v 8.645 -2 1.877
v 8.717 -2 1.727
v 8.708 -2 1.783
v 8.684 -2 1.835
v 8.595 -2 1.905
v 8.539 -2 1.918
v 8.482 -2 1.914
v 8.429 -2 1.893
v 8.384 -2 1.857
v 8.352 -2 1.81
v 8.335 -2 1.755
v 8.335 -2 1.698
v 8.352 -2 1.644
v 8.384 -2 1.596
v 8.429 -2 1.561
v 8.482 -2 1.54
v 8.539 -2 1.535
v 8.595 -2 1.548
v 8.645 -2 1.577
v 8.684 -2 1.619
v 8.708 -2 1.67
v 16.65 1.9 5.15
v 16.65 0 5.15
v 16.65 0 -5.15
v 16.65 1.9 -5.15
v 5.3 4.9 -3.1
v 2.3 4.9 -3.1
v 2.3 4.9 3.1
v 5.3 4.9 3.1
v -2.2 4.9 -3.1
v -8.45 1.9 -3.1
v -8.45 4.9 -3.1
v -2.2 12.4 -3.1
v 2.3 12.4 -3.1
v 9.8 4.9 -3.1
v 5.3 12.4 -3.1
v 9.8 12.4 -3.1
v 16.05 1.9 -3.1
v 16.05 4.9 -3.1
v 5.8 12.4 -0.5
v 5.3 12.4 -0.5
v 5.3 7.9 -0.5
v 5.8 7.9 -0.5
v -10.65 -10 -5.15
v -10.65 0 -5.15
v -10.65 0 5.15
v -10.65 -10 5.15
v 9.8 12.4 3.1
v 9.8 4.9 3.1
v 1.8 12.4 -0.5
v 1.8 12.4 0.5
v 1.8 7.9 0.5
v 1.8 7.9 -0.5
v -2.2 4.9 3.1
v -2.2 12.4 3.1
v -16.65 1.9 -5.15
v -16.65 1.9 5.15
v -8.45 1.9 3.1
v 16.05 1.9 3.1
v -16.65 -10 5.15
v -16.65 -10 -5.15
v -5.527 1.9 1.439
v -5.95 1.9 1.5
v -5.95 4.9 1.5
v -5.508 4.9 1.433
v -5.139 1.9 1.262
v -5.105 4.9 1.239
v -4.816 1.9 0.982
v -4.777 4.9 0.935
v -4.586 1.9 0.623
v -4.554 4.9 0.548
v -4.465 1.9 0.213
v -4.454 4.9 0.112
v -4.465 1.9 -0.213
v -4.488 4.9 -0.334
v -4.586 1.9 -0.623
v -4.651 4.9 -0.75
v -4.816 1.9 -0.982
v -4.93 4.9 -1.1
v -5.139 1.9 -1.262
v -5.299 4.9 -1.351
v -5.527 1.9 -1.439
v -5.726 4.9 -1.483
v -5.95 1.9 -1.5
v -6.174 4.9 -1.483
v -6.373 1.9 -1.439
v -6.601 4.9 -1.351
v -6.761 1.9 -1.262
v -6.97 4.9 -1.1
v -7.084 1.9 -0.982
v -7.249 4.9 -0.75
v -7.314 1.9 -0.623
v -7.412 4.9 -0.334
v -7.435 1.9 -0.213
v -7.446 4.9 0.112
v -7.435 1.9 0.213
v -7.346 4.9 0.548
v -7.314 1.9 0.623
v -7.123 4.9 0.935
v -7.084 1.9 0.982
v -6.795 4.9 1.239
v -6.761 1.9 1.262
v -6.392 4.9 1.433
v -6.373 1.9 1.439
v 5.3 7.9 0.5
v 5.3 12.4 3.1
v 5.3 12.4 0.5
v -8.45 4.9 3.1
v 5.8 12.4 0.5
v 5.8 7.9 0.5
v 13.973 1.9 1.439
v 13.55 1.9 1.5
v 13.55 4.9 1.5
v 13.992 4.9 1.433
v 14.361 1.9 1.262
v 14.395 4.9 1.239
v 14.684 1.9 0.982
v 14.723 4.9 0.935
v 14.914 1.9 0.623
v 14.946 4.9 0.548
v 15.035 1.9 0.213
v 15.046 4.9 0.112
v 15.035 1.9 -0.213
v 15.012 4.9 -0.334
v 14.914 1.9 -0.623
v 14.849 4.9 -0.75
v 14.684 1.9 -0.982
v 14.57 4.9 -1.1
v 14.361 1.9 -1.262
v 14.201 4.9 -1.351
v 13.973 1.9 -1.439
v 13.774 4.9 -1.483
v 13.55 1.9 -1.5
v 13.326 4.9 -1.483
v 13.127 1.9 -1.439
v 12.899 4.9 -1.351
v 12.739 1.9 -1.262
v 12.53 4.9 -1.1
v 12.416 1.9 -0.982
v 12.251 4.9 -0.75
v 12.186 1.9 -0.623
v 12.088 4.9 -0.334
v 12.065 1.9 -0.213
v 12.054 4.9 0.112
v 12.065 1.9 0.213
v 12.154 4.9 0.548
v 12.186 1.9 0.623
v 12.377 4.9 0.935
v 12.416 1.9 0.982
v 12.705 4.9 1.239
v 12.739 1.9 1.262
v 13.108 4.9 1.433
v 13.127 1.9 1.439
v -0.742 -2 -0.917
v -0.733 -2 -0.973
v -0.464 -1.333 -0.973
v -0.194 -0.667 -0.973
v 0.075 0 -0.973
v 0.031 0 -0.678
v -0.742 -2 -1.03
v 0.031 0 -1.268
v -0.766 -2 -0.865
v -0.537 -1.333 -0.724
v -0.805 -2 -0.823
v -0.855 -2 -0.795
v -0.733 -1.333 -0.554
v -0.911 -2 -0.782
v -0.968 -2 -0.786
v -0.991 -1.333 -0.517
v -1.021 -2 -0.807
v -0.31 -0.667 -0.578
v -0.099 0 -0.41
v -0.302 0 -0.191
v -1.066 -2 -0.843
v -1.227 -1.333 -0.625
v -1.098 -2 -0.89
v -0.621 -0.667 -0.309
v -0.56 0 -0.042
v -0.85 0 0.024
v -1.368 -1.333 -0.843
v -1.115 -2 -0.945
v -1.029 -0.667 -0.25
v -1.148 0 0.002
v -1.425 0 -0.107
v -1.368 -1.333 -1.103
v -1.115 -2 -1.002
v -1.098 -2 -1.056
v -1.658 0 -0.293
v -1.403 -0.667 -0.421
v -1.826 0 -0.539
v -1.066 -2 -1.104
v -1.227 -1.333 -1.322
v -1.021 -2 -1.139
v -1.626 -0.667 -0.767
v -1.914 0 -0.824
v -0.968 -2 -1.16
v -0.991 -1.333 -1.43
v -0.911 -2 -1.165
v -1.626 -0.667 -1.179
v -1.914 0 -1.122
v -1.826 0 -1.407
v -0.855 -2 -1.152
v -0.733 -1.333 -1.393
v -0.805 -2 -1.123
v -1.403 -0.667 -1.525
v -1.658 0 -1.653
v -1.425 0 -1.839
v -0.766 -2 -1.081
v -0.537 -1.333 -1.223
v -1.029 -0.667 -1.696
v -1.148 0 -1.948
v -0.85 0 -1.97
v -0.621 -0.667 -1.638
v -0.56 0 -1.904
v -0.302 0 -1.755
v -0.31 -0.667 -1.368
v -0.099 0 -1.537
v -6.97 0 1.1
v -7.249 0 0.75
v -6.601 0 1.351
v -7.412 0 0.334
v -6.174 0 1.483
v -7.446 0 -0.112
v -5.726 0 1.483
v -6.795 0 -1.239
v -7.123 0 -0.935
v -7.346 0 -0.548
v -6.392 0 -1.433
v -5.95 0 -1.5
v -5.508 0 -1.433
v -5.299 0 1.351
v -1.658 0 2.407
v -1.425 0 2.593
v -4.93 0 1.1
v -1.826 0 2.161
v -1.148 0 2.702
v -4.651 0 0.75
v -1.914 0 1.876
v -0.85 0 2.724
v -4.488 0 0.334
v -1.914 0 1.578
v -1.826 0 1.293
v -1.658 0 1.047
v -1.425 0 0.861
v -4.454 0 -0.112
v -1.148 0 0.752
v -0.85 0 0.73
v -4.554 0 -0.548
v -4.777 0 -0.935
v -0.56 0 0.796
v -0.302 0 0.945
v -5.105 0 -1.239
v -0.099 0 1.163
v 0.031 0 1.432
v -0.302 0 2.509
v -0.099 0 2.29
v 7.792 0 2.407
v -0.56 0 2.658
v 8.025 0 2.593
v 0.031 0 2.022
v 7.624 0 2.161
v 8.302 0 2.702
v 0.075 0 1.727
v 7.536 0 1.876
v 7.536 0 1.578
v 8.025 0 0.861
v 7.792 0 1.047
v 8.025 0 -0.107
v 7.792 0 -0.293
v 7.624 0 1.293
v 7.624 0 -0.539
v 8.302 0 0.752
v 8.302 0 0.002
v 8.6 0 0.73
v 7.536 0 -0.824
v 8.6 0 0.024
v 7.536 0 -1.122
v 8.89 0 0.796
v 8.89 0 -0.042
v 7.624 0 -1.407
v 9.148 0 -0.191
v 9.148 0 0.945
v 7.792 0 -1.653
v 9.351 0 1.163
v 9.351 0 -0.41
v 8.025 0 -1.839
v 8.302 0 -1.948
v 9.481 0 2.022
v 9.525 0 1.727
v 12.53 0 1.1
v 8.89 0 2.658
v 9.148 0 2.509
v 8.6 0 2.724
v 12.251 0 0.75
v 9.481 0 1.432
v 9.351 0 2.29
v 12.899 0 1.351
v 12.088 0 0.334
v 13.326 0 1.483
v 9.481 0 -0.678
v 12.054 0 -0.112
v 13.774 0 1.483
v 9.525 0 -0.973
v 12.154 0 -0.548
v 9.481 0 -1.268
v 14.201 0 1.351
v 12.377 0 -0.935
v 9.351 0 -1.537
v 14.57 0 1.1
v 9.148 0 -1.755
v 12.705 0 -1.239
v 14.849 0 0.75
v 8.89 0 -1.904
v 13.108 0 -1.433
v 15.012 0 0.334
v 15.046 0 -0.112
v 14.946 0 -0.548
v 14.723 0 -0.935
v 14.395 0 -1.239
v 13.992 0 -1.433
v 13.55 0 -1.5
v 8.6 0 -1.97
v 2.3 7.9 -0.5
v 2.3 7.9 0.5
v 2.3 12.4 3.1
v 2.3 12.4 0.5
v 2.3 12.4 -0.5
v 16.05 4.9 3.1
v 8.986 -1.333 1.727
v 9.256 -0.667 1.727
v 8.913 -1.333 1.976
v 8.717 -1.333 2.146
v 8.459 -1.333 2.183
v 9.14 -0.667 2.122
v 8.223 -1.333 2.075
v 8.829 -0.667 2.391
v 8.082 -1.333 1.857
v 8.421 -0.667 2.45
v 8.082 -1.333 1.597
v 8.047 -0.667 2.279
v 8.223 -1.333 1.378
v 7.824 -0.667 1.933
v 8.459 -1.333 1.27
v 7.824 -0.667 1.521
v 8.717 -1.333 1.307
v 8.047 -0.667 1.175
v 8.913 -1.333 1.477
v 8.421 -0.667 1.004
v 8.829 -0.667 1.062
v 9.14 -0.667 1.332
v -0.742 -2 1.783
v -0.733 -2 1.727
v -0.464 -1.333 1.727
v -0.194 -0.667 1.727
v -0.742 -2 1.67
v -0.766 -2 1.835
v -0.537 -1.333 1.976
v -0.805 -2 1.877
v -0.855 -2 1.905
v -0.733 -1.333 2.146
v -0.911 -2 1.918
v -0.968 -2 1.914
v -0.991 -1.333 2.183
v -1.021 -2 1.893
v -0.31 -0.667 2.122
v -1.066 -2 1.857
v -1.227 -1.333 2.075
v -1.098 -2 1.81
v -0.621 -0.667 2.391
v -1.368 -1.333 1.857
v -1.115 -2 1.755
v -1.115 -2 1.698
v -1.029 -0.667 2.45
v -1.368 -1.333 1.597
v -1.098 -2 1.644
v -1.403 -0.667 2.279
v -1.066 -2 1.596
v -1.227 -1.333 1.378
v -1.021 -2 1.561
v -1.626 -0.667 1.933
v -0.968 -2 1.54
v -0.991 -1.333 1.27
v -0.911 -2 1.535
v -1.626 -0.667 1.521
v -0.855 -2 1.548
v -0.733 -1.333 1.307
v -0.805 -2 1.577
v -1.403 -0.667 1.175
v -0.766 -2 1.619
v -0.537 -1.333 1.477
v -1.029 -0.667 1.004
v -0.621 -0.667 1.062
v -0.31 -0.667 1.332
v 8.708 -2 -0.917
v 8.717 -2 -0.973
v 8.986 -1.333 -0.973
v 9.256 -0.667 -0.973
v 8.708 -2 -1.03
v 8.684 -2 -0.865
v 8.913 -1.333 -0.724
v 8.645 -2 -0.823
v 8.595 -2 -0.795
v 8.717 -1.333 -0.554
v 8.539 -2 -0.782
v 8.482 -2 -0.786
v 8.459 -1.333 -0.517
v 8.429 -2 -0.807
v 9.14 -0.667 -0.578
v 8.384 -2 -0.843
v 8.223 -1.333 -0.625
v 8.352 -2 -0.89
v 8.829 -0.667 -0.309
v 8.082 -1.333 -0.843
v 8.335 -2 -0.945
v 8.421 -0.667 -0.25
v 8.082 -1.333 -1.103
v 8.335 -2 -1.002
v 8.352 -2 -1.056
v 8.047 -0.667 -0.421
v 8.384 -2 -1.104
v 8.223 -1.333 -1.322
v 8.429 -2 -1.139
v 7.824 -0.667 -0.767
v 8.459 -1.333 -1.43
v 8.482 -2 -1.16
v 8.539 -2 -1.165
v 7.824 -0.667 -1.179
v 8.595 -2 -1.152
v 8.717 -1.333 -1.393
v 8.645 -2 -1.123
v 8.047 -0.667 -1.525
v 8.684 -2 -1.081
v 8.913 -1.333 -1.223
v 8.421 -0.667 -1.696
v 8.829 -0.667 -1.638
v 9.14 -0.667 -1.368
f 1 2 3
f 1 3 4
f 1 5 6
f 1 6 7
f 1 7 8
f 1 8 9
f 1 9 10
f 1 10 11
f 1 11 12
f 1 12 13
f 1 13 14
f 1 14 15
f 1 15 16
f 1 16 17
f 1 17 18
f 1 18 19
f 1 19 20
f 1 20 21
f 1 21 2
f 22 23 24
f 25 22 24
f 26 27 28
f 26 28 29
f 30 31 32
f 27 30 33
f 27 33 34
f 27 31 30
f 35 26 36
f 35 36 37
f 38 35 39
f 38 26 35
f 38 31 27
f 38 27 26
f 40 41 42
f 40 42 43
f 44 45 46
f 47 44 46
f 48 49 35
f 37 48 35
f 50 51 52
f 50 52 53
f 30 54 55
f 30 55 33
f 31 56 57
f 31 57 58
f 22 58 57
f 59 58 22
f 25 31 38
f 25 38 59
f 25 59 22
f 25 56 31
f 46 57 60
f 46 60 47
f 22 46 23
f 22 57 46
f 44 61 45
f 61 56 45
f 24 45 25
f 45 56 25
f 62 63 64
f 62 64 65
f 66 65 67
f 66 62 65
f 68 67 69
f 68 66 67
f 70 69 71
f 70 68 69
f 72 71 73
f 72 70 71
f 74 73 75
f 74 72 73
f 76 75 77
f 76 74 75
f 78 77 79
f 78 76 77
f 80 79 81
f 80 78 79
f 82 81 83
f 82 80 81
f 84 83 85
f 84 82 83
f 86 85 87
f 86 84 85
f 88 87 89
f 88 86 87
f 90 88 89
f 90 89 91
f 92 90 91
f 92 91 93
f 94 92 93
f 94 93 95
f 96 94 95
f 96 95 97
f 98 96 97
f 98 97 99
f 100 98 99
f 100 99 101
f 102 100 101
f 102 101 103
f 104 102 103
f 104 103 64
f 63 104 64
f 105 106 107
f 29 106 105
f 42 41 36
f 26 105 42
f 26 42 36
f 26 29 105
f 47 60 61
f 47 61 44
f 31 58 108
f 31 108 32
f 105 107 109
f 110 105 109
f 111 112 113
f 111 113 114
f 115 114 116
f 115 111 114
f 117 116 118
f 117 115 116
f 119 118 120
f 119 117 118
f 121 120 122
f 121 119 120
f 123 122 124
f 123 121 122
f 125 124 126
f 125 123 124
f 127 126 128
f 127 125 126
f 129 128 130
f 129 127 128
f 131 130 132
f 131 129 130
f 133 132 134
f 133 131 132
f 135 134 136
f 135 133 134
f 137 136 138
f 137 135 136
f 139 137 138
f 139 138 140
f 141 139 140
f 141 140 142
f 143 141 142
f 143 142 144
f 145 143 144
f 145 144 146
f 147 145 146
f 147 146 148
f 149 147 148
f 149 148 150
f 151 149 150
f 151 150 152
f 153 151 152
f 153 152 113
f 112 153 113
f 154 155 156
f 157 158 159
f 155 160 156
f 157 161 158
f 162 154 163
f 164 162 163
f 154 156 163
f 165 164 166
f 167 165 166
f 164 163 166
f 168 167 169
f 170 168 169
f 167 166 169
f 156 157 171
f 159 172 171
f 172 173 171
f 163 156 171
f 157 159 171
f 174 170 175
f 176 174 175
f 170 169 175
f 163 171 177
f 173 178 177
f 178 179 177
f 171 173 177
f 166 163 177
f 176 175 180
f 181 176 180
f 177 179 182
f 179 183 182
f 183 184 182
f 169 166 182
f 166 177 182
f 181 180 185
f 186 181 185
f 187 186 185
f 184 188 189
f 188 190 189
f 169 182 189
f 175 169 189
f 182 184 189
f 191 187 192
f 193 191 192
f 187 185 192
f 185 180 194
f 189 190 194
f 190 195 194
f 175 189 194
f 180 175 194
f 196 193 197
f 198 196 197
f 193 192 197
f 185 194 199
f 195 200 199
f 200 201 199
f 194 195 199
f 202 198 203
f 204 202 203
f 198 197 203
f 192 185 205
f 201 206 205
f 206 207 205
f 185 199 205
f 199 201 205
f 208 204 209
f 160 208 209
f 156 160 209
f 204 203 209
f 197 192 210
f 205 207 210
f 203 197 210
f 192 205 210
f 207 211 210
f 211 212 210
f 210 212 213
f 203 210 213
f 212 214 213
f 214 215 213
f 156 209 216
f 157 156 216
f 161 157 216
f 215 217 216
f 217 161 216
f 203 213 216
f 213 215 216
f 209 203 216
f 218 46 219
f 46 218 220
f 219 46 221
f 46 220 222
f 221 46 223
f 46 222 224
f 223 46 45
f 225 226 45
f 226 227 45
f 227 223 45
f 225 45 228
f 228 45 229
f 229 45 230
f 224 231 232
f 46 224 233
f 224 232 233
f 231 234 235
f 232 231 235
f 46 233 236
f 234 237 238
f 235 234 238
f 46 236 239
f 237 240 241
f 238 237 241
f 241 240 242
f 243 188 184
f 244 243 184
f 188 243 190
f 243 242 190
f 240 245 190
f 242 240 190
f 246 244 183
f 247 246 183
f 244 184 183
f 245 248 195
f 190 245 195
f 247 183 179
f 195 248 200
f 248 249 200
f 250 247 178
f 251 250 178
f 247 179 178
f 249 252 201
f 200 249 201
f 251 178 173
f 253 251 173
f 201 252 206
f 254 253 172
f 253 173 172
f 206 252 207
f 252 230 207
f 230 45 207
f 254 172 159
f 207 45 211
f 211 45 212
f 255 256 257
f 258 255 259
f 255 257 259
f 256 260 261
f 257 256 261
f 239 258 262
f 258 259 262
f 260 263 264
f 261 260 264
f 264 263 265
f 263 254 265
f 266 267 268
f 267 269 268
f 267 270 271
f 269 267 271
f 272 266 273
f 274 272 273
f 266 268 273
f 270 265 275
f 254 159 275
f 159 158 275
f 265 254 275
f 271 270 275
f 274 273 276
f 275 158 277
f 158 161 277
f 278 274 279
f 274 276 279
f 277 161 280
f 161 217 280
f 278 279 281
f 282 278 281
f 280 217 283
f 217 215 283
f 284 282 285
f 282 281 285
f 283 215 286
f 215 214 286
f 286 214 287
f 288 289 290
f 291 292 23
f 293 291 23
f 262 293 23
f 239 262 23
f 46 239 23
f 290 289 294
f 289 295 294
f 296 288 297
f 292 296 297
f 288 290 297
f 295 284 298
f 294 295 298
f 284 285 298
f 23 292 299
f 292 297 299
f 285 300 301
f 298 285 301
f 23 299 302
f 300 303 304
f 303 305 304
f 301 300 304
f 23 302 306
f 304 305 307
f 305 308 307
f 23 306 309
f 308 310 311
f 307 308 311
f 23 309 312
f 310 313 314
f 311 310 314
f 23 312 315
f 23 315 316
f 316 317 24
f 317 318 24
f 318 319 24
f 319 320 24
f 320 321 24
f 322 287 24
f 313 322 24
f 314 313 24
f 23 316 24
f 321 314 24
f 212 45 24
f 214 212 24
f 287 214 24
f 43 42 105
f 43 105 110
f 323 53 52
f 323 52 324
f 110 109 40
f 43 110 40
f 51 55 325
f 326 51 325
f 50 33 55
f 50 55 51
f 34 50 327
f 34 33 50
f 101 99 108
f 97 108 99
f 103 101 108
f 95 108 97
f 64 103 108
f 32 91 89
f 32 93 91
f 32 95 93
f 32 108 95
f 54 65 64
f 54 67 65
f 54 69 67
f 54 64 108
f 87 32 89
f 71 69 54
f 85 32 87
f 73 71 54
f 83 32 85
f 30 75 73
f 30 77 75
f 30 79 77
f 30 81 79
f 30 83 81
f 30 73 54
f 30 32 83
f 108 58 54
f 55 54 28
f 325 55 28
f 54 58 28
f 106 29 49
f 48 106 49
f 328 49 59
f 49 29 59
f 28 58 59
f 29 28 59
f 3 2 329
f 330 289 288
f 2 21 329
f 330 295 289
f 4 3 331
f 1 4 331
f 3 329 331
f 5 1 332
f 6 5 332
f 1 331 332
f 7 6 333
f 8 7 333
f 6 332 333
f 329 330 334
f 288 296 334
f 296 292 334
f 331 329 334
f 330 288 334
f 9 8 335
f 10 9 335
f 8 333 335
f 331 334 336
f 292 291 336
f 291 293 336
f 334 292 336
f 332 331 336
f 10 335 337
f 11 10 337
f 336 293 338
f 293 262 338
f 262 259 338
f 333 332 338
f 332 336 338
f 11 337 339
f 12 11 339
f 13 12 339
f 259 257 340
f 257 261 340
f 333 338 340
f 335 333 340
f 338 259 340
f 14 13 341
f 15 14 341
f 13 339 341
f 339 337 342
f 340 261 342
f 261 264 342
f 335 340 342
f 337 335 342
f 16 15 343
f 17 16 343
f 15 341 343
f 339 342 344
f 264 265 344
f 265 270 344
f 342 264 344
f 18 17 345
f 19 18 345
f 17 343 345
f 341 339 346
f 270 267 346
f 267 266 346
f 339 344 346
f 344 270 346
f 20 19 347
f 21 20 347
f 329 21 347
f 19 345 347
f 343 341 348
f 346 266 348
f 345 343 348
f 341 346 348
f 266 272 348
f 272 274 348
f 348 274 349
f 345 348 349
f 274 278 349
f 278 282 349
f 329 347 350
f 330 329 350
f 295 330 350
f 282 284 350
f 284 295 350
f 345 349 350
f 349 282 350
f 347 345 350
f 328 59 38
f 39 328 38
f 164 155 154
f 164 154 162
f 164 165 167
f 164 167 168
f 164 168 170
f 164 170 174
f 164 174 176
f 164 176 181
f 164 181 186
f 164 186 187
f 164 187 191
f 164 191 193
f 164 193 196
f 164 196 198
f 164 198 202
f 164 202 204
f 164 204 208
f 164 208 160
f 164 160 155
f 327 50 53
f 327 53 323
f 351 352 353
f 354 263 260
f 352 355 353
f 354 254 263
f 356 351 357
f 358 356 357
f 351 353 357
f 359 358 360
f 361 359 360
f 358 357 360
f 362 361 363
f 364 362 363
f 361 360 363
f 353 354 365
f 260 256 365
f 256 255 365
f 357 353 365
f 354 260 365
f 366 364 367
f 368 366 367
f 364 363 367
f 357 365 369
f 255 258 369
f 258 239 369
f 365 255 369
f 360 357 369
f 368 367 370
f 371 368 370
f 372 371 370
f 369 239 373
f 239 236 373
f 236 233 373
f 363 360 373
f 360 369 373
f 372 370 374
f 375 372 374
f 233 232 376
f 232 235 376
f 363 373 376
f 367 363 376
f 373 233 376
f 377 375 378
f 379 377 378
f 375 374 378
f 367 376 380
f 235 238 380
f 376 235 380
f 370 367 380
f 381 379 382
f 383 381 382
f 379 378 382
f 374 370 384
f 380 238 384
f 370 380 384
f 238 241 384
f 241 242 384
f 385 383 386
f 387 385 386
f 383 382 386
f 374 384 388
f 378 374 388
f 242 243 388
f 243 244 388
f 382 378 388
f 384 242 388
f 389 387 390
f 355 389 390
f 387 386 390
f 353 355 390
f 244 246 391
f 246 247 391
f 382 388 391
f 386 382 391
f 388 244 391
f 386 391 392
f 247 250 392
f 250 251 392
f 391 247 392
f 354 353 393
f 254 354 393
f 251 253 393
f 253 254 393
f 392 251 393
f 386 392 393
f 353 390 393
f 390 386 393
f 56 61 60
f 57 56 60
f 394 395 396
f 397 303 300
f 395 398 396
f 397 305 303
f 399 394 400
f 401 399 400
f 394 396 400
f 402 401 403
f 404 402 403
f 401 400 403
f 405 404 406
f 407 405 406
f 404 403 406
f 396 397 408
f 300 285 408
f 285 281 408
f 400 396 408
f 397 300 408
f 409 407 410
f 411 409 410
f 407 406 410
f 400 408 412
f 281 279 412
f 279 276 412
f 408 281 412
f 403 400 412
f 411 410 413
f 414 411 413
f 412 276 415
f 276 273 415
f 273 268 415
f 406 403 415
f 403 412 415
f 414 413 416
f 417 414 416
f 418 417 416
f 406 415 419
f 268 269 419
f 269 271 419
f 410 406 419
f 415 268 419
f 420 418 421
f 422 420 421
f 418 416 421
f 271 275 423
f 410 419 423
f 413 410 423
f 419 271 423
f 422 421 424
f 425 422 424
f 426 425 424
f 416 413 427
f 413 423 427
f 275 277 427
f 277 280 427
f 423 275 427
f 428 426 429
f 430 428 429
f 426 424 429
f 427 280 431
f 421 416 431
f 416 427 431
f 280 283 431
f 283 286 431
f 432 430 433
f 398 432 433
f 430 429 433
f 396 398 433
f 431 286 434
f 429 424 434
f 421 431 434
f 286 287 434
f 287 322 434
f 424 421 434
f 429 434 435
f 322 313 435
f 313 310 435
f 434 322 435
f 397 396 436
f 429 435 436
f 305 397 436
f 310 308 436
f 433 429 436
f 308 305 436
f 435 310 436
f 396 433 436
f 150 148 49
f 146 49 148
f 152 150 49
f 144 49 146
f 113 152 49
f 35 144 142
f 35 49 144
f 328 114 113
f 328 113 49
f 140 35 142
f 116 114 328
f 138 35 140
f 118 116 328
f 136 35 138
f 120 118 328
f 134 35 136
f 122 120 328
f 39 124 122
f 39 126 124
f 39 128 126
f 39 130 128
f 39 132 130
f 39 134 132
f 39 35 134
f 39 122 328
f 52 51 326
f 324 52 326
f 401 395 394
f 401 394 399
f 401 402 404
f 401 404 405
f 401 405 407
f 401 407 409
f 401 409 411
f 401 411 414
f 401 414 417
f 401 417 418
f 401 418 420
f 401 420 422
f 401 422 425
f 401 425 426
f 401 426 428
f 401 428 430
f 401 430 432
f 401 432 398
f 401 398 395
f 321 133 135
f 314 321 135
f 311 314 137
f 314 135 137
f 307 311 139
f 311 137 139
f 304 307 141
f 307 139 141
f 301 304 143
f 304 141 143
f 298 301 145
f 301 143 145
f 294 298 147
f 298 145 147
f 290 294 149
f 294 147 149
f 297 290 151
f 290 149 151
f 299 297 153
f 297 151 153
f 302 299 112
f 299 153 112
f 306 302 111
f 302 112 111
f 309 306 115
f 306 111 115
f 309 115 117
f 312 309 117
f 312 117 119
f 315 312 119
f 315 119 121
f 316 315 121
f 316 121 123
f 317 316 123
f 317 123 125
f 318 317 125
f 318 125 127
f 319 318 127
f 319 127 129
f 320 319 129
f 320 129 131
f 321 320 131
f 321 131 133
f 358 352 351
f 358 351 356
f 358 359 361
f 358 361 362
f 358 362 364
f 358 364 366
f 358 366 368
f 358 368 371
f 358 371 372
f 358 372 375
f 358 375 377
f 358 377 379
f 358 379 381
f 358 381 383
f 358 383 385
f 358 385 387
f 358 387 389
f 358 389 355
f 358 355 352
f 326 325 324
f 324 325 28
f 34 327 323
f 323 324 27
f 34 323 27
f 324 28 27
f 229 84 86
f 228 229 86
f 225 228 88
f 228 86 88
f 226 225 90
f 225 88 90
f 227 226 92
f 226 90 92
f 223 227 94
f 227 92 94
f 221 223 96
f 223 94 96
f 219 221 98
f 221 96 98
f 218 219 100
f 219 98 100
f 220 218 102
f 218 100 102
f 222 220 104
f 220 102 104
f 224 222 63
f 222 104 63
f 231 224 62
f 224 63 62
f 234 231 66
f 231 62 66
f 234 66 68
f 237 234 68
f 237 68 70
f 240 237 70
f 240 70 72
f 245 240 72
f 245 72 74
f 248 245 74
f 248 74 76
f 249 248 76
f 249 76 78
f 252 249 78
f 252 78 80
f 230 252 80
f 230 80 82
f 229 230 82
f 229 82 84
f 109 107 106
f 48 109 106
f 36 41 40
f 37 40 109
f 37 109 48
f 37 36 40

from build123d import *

# Parameters (mm, degrees)
SKETCH1_W                     = 33.3
SKETCH1_H                     = 10.3
BOSS_EXTRUDE1_DEPTH           = 1.9
SKETCH2_W                     = 24.5
SKETCH2_H                     = 6.2
SKETCH2_R                     = 1.5
BOSS_EXTRUDE2_DEPTH           = 3
SKETCH3_W                     = 4.5
SKETCH3_H                     = 6.2
BOSS_EXTRUDE3_DEPTH           = 7.5
SKETCH4_W                     = 6
SKETCH4_H                     = 10.3
BOSS_EXTRUDE4_DEPTH           = 10
SKETCH5_R                     = 1
BOSS_EXTRUDE5_DEPTH           = 2
BOSS_EXTRUDE5_DRAFT           = 22
BOSS_EXTRUDE5_PROFILE_2_DEPTH = 2
BOSS_EXTRUDE5_PROFILE_2_DRAFT = 22
BOSS_EXTRUDE5_PROFILE_3_DEPTH = 2
BOSS_EXTRUDE5_PROFILE_3_DRAFT = 22
BOSS_EXTRUDE5_PROFILE_4_DEPTH = 2
BOSS_EXTRUDE5_PROFILE_4_DRAFT = 22
SKETCH6_W                     = 4
SKETCH6_H                     = 1
CUT_EXTRUDE1_DEPTH            = 4.5
CUT_EXTRUDE2_REACH            = 23.103
SKETCH2_2_R                   = 1.5


with BuildPart() as part:
    # Sketch1 → Boss-Extrude1 (new body)
    with BuildSketch(Plane(origin=(0, 0, 0), x_dir=(1, 0, 0), z_dir=(0, 1, 0))):
        Rectangle(SKETCH1_W, SKETCH1_H)
    extrude(amount=BOSS_EXTRUDE1_DEPTH)

    # Sketch2 → Boss-Extrude2 (add)
    with BuildSketch(Plane(origin=(0, 1.9, 0), x_dir=(1, 0, 0), z_dir=(0, 1, 0))):
        with Locations((3.8, 0)):
            Rectangle(SKETCH2_W, SKETCH2_H)
        with Locations((-5.95, 0)):
            Circle(SKETCH2_R, mode=Mode.SUBTRACT)
        with Locations((13.55, 0)):
            Circle(SKETCH2_R, mode=Mode.SUBTRACT)
    extrude(amount=BOSS_EXTRUDE2_DEPTH)

    # Sketch3 → Boss-Extrude3 (add)
    with BuildSketch(Plane(origin=(0, 4.9, 0), x_dir=(1, 0, 0), z_dir=(0, 1, 0))):
        with Locations((0.05, 0)):
            Rectangle(SKETCH3_W, SKETCH3_H)
        with Locations((7.55, 0)):
            Rectangle(SKETCH3_W, SKETCH3_H)
    extrude(amount=BOSS_EXTRUDE3_DEPTH)

    # Sketch4 → Boss-Extrude4 (add)
    with BuildSketch(Plane.XZ):
        with Locations((-13.65, 0)):
            Rectangle(SKETCH4_W, SKETCH4_H)
    extrude(amount=BOSS_EXTRUDE4_DEPTH)


with BuildPart() as boss_extrude5_tool:
    # Sketch5 → Boss-Extrude5 (with draft: the straight prism first)
    with BuildSketch(Plane.XZ):
        with Locations((-0.925, 1.726795989)):
            Circle(SKETCH5_R)
    extrude(amount=BOSS_EXTRUDE5_DEPTH)
    # Boss-Extrude5: the draft: its side faces are tilted about the plane it starts from
    boss_extrude5_sides = [boss_extrude5_tool.faces().sort_by_distance(p)[0] for p in [
        (-1.925, -1, 1.726795989),
    ]]
    draft(boss_extrude5_sides, Plane.XZ, BOSS_EXTRUDE5_DRAFT)


with BuildPart() as part_1:
    add(part.part)

    # Boss-Extrude5: add boss_extrude5_tool
    add(boss_extrude5_tool.part)


with BuildPart() as boss_extrude5_profile_2_tool:
    # Sketch5 → Boss-Extrude5 profile 2 (with draft: the straight prism first)
    with BuildSketch(Plane.XZ):
        with Locations((-0.925, -0.973204011)):
            Circle(SKETCH5_R)
    extrude(amount=BOSS_EXTRUDE5_PROFILE_2_DEPTH)
    # Boss-Extrude5 profile 2: the draft: its side faces are tilted about the plane it starts from
    boss_extrude5_profile_2_sides = [boss_extrude5_profile_2_tool.faces().sort_by_distance(p)[0] for p in [
        (-1.925, -1, -0.973204011),
    ]]
    draft(boss_extrude5_profile_2_sides, Plane.XZ, BOSS_EXTRUDE5_PROFILE_2_DRAFT)


with BuildPart() as part_2:
    add(part_1.part)

    # Boss-Extrude5 profile 2: add boss_extrude5_profile_2_tool
    add(boss_extrude5_profile_2_tool.part)


with BuildPart() as boss_extrude5_profile_3_tool:
    # Sketch5 → Boss-Extrude5 profile 3 (with draft: the straight prism first)
    with BuildSketch(Plane.XZ):
        with Locations((8.525, -0.973204011)):
            Circle(SKETCH5_R)
    extrude(amount=BOSS_EXTRUDE5_PROFILE_3_DEPTH)
    # Boss-Extrude5 profile 3: the draft: its side faces are tilted about the plane it starts from
    boss_extrude5_profile_3_sides = [boss_extrude5_profile_3_tool.faces().sort_by_distance(p)[0] for p in [
        (7.525, -1, -0.973204011),
    ]]
    draft(boss_extrude5_profile_3_sides, Plane.XZ, BOSS_EXTRUDE5_PROFILE_3_DRAFT)


with BuildPart() as part_3:
    add(part_2.part)

    # Boss-Extrude5 profile 3: add boss_extrude5_profile_3_tool
    add(boss_extrude5_profile_3_tool.part)


with BuildPart() as boss_extrude5_profile_4_tool:
    # Sketch5 → Boss-Extrude5 profile 4 (with draft: the straight prism first)
    with BuildSketch(Plane.XZ):
        with Locations((8.525, 1.726795989)):
            Circle(SKETCH5_R)
    extrude(amount=BOSS_EXTRUDE5_PROFILE_4_DEPTH)
    # Boss-Extrude5 profile 4: the draft: its side faces are tilted about the plane it starts from
    boss_extrude5_profile_4_sides = [boss_extrude5_profile_4_tool.faces().sort_by_distance(p)[0] for p in [
        (7.525, -1, 1.726795989),
    ]]
    draft(boss_extrude5_profile_4_sides, Plane.XZ, BOSS_EXTRUDE5_PROFILE_4_DRAFT)


with BuildPart() as part_4:
    add(part_3.part)

    # Boss-Extrude5 profile 4: add boss_extrude5_profile_4_tool
    add(boss_extrude5_profile_4_tool.part)

    # Sketch6 → Cut-Extrude1 (cut)
    with BuildSketch(Plane(origin=(0, 12.4, 0), x_dir=(1, 0, 0), z_dir=(0, 1, 0))):
        with Locations((3.8, 0)):
            Rectangle(SKETCH6_W, SKETCH6_H)
    extrude(amount=-CUT_EXTRUDE1_DEPTH, mode=Mode.SUBTRACT)

    # Sketch2<2> → Cut-Extrude2 (cut, up to next)
    with BuildSketch(Plane(origin=(0, 1.9, 0), x_dir=(1, 0, 0), z_dir=(0, 1, 0)), mode=Mode.PRIVATE) as cut_extrude2_sk1:
        with Locations((-5.95, 0)):
            Circle(SKETCH2_2_R)
    cut_extrude2_tool1 = extrude(cut_extrude2_sk1.sketch, amount=-CUT_EXTRUDE2_REACH, mode=Mode.PRIVATE) & part_4.part
    # Sketch2<2> → Cut-Extrude2 (cut, up to next)
    with BuildSketch(Plane(origin=(0, 1.9, 0), x_dir=(1, 0, 0), z_dir=(0, 1, 0)), mode=Mode.PRIVATE) as cut_extrude2_sk2:
        with Locations((13.55, 0)):
            Circle(SKETCH2_2_R)
    cut_extrude2_tool2 = extrude(cut_extrude2_sk2.sketch, amount=-CUT_EXTRUDE2_REACH, mode=Mode.PRIVATE) & part_4.part
    add(cut_extrude2_tool1.solids().sort_by_distance((-5.95, 1.9, 0))[0], mode=Mode.SUBTRACT)
    add(cut_extrude2_tool2.solids().sort_by_distance((13.55, 1.9, 0))[0], mode=Mode.SUBTRACT)


solid = part_4.part
